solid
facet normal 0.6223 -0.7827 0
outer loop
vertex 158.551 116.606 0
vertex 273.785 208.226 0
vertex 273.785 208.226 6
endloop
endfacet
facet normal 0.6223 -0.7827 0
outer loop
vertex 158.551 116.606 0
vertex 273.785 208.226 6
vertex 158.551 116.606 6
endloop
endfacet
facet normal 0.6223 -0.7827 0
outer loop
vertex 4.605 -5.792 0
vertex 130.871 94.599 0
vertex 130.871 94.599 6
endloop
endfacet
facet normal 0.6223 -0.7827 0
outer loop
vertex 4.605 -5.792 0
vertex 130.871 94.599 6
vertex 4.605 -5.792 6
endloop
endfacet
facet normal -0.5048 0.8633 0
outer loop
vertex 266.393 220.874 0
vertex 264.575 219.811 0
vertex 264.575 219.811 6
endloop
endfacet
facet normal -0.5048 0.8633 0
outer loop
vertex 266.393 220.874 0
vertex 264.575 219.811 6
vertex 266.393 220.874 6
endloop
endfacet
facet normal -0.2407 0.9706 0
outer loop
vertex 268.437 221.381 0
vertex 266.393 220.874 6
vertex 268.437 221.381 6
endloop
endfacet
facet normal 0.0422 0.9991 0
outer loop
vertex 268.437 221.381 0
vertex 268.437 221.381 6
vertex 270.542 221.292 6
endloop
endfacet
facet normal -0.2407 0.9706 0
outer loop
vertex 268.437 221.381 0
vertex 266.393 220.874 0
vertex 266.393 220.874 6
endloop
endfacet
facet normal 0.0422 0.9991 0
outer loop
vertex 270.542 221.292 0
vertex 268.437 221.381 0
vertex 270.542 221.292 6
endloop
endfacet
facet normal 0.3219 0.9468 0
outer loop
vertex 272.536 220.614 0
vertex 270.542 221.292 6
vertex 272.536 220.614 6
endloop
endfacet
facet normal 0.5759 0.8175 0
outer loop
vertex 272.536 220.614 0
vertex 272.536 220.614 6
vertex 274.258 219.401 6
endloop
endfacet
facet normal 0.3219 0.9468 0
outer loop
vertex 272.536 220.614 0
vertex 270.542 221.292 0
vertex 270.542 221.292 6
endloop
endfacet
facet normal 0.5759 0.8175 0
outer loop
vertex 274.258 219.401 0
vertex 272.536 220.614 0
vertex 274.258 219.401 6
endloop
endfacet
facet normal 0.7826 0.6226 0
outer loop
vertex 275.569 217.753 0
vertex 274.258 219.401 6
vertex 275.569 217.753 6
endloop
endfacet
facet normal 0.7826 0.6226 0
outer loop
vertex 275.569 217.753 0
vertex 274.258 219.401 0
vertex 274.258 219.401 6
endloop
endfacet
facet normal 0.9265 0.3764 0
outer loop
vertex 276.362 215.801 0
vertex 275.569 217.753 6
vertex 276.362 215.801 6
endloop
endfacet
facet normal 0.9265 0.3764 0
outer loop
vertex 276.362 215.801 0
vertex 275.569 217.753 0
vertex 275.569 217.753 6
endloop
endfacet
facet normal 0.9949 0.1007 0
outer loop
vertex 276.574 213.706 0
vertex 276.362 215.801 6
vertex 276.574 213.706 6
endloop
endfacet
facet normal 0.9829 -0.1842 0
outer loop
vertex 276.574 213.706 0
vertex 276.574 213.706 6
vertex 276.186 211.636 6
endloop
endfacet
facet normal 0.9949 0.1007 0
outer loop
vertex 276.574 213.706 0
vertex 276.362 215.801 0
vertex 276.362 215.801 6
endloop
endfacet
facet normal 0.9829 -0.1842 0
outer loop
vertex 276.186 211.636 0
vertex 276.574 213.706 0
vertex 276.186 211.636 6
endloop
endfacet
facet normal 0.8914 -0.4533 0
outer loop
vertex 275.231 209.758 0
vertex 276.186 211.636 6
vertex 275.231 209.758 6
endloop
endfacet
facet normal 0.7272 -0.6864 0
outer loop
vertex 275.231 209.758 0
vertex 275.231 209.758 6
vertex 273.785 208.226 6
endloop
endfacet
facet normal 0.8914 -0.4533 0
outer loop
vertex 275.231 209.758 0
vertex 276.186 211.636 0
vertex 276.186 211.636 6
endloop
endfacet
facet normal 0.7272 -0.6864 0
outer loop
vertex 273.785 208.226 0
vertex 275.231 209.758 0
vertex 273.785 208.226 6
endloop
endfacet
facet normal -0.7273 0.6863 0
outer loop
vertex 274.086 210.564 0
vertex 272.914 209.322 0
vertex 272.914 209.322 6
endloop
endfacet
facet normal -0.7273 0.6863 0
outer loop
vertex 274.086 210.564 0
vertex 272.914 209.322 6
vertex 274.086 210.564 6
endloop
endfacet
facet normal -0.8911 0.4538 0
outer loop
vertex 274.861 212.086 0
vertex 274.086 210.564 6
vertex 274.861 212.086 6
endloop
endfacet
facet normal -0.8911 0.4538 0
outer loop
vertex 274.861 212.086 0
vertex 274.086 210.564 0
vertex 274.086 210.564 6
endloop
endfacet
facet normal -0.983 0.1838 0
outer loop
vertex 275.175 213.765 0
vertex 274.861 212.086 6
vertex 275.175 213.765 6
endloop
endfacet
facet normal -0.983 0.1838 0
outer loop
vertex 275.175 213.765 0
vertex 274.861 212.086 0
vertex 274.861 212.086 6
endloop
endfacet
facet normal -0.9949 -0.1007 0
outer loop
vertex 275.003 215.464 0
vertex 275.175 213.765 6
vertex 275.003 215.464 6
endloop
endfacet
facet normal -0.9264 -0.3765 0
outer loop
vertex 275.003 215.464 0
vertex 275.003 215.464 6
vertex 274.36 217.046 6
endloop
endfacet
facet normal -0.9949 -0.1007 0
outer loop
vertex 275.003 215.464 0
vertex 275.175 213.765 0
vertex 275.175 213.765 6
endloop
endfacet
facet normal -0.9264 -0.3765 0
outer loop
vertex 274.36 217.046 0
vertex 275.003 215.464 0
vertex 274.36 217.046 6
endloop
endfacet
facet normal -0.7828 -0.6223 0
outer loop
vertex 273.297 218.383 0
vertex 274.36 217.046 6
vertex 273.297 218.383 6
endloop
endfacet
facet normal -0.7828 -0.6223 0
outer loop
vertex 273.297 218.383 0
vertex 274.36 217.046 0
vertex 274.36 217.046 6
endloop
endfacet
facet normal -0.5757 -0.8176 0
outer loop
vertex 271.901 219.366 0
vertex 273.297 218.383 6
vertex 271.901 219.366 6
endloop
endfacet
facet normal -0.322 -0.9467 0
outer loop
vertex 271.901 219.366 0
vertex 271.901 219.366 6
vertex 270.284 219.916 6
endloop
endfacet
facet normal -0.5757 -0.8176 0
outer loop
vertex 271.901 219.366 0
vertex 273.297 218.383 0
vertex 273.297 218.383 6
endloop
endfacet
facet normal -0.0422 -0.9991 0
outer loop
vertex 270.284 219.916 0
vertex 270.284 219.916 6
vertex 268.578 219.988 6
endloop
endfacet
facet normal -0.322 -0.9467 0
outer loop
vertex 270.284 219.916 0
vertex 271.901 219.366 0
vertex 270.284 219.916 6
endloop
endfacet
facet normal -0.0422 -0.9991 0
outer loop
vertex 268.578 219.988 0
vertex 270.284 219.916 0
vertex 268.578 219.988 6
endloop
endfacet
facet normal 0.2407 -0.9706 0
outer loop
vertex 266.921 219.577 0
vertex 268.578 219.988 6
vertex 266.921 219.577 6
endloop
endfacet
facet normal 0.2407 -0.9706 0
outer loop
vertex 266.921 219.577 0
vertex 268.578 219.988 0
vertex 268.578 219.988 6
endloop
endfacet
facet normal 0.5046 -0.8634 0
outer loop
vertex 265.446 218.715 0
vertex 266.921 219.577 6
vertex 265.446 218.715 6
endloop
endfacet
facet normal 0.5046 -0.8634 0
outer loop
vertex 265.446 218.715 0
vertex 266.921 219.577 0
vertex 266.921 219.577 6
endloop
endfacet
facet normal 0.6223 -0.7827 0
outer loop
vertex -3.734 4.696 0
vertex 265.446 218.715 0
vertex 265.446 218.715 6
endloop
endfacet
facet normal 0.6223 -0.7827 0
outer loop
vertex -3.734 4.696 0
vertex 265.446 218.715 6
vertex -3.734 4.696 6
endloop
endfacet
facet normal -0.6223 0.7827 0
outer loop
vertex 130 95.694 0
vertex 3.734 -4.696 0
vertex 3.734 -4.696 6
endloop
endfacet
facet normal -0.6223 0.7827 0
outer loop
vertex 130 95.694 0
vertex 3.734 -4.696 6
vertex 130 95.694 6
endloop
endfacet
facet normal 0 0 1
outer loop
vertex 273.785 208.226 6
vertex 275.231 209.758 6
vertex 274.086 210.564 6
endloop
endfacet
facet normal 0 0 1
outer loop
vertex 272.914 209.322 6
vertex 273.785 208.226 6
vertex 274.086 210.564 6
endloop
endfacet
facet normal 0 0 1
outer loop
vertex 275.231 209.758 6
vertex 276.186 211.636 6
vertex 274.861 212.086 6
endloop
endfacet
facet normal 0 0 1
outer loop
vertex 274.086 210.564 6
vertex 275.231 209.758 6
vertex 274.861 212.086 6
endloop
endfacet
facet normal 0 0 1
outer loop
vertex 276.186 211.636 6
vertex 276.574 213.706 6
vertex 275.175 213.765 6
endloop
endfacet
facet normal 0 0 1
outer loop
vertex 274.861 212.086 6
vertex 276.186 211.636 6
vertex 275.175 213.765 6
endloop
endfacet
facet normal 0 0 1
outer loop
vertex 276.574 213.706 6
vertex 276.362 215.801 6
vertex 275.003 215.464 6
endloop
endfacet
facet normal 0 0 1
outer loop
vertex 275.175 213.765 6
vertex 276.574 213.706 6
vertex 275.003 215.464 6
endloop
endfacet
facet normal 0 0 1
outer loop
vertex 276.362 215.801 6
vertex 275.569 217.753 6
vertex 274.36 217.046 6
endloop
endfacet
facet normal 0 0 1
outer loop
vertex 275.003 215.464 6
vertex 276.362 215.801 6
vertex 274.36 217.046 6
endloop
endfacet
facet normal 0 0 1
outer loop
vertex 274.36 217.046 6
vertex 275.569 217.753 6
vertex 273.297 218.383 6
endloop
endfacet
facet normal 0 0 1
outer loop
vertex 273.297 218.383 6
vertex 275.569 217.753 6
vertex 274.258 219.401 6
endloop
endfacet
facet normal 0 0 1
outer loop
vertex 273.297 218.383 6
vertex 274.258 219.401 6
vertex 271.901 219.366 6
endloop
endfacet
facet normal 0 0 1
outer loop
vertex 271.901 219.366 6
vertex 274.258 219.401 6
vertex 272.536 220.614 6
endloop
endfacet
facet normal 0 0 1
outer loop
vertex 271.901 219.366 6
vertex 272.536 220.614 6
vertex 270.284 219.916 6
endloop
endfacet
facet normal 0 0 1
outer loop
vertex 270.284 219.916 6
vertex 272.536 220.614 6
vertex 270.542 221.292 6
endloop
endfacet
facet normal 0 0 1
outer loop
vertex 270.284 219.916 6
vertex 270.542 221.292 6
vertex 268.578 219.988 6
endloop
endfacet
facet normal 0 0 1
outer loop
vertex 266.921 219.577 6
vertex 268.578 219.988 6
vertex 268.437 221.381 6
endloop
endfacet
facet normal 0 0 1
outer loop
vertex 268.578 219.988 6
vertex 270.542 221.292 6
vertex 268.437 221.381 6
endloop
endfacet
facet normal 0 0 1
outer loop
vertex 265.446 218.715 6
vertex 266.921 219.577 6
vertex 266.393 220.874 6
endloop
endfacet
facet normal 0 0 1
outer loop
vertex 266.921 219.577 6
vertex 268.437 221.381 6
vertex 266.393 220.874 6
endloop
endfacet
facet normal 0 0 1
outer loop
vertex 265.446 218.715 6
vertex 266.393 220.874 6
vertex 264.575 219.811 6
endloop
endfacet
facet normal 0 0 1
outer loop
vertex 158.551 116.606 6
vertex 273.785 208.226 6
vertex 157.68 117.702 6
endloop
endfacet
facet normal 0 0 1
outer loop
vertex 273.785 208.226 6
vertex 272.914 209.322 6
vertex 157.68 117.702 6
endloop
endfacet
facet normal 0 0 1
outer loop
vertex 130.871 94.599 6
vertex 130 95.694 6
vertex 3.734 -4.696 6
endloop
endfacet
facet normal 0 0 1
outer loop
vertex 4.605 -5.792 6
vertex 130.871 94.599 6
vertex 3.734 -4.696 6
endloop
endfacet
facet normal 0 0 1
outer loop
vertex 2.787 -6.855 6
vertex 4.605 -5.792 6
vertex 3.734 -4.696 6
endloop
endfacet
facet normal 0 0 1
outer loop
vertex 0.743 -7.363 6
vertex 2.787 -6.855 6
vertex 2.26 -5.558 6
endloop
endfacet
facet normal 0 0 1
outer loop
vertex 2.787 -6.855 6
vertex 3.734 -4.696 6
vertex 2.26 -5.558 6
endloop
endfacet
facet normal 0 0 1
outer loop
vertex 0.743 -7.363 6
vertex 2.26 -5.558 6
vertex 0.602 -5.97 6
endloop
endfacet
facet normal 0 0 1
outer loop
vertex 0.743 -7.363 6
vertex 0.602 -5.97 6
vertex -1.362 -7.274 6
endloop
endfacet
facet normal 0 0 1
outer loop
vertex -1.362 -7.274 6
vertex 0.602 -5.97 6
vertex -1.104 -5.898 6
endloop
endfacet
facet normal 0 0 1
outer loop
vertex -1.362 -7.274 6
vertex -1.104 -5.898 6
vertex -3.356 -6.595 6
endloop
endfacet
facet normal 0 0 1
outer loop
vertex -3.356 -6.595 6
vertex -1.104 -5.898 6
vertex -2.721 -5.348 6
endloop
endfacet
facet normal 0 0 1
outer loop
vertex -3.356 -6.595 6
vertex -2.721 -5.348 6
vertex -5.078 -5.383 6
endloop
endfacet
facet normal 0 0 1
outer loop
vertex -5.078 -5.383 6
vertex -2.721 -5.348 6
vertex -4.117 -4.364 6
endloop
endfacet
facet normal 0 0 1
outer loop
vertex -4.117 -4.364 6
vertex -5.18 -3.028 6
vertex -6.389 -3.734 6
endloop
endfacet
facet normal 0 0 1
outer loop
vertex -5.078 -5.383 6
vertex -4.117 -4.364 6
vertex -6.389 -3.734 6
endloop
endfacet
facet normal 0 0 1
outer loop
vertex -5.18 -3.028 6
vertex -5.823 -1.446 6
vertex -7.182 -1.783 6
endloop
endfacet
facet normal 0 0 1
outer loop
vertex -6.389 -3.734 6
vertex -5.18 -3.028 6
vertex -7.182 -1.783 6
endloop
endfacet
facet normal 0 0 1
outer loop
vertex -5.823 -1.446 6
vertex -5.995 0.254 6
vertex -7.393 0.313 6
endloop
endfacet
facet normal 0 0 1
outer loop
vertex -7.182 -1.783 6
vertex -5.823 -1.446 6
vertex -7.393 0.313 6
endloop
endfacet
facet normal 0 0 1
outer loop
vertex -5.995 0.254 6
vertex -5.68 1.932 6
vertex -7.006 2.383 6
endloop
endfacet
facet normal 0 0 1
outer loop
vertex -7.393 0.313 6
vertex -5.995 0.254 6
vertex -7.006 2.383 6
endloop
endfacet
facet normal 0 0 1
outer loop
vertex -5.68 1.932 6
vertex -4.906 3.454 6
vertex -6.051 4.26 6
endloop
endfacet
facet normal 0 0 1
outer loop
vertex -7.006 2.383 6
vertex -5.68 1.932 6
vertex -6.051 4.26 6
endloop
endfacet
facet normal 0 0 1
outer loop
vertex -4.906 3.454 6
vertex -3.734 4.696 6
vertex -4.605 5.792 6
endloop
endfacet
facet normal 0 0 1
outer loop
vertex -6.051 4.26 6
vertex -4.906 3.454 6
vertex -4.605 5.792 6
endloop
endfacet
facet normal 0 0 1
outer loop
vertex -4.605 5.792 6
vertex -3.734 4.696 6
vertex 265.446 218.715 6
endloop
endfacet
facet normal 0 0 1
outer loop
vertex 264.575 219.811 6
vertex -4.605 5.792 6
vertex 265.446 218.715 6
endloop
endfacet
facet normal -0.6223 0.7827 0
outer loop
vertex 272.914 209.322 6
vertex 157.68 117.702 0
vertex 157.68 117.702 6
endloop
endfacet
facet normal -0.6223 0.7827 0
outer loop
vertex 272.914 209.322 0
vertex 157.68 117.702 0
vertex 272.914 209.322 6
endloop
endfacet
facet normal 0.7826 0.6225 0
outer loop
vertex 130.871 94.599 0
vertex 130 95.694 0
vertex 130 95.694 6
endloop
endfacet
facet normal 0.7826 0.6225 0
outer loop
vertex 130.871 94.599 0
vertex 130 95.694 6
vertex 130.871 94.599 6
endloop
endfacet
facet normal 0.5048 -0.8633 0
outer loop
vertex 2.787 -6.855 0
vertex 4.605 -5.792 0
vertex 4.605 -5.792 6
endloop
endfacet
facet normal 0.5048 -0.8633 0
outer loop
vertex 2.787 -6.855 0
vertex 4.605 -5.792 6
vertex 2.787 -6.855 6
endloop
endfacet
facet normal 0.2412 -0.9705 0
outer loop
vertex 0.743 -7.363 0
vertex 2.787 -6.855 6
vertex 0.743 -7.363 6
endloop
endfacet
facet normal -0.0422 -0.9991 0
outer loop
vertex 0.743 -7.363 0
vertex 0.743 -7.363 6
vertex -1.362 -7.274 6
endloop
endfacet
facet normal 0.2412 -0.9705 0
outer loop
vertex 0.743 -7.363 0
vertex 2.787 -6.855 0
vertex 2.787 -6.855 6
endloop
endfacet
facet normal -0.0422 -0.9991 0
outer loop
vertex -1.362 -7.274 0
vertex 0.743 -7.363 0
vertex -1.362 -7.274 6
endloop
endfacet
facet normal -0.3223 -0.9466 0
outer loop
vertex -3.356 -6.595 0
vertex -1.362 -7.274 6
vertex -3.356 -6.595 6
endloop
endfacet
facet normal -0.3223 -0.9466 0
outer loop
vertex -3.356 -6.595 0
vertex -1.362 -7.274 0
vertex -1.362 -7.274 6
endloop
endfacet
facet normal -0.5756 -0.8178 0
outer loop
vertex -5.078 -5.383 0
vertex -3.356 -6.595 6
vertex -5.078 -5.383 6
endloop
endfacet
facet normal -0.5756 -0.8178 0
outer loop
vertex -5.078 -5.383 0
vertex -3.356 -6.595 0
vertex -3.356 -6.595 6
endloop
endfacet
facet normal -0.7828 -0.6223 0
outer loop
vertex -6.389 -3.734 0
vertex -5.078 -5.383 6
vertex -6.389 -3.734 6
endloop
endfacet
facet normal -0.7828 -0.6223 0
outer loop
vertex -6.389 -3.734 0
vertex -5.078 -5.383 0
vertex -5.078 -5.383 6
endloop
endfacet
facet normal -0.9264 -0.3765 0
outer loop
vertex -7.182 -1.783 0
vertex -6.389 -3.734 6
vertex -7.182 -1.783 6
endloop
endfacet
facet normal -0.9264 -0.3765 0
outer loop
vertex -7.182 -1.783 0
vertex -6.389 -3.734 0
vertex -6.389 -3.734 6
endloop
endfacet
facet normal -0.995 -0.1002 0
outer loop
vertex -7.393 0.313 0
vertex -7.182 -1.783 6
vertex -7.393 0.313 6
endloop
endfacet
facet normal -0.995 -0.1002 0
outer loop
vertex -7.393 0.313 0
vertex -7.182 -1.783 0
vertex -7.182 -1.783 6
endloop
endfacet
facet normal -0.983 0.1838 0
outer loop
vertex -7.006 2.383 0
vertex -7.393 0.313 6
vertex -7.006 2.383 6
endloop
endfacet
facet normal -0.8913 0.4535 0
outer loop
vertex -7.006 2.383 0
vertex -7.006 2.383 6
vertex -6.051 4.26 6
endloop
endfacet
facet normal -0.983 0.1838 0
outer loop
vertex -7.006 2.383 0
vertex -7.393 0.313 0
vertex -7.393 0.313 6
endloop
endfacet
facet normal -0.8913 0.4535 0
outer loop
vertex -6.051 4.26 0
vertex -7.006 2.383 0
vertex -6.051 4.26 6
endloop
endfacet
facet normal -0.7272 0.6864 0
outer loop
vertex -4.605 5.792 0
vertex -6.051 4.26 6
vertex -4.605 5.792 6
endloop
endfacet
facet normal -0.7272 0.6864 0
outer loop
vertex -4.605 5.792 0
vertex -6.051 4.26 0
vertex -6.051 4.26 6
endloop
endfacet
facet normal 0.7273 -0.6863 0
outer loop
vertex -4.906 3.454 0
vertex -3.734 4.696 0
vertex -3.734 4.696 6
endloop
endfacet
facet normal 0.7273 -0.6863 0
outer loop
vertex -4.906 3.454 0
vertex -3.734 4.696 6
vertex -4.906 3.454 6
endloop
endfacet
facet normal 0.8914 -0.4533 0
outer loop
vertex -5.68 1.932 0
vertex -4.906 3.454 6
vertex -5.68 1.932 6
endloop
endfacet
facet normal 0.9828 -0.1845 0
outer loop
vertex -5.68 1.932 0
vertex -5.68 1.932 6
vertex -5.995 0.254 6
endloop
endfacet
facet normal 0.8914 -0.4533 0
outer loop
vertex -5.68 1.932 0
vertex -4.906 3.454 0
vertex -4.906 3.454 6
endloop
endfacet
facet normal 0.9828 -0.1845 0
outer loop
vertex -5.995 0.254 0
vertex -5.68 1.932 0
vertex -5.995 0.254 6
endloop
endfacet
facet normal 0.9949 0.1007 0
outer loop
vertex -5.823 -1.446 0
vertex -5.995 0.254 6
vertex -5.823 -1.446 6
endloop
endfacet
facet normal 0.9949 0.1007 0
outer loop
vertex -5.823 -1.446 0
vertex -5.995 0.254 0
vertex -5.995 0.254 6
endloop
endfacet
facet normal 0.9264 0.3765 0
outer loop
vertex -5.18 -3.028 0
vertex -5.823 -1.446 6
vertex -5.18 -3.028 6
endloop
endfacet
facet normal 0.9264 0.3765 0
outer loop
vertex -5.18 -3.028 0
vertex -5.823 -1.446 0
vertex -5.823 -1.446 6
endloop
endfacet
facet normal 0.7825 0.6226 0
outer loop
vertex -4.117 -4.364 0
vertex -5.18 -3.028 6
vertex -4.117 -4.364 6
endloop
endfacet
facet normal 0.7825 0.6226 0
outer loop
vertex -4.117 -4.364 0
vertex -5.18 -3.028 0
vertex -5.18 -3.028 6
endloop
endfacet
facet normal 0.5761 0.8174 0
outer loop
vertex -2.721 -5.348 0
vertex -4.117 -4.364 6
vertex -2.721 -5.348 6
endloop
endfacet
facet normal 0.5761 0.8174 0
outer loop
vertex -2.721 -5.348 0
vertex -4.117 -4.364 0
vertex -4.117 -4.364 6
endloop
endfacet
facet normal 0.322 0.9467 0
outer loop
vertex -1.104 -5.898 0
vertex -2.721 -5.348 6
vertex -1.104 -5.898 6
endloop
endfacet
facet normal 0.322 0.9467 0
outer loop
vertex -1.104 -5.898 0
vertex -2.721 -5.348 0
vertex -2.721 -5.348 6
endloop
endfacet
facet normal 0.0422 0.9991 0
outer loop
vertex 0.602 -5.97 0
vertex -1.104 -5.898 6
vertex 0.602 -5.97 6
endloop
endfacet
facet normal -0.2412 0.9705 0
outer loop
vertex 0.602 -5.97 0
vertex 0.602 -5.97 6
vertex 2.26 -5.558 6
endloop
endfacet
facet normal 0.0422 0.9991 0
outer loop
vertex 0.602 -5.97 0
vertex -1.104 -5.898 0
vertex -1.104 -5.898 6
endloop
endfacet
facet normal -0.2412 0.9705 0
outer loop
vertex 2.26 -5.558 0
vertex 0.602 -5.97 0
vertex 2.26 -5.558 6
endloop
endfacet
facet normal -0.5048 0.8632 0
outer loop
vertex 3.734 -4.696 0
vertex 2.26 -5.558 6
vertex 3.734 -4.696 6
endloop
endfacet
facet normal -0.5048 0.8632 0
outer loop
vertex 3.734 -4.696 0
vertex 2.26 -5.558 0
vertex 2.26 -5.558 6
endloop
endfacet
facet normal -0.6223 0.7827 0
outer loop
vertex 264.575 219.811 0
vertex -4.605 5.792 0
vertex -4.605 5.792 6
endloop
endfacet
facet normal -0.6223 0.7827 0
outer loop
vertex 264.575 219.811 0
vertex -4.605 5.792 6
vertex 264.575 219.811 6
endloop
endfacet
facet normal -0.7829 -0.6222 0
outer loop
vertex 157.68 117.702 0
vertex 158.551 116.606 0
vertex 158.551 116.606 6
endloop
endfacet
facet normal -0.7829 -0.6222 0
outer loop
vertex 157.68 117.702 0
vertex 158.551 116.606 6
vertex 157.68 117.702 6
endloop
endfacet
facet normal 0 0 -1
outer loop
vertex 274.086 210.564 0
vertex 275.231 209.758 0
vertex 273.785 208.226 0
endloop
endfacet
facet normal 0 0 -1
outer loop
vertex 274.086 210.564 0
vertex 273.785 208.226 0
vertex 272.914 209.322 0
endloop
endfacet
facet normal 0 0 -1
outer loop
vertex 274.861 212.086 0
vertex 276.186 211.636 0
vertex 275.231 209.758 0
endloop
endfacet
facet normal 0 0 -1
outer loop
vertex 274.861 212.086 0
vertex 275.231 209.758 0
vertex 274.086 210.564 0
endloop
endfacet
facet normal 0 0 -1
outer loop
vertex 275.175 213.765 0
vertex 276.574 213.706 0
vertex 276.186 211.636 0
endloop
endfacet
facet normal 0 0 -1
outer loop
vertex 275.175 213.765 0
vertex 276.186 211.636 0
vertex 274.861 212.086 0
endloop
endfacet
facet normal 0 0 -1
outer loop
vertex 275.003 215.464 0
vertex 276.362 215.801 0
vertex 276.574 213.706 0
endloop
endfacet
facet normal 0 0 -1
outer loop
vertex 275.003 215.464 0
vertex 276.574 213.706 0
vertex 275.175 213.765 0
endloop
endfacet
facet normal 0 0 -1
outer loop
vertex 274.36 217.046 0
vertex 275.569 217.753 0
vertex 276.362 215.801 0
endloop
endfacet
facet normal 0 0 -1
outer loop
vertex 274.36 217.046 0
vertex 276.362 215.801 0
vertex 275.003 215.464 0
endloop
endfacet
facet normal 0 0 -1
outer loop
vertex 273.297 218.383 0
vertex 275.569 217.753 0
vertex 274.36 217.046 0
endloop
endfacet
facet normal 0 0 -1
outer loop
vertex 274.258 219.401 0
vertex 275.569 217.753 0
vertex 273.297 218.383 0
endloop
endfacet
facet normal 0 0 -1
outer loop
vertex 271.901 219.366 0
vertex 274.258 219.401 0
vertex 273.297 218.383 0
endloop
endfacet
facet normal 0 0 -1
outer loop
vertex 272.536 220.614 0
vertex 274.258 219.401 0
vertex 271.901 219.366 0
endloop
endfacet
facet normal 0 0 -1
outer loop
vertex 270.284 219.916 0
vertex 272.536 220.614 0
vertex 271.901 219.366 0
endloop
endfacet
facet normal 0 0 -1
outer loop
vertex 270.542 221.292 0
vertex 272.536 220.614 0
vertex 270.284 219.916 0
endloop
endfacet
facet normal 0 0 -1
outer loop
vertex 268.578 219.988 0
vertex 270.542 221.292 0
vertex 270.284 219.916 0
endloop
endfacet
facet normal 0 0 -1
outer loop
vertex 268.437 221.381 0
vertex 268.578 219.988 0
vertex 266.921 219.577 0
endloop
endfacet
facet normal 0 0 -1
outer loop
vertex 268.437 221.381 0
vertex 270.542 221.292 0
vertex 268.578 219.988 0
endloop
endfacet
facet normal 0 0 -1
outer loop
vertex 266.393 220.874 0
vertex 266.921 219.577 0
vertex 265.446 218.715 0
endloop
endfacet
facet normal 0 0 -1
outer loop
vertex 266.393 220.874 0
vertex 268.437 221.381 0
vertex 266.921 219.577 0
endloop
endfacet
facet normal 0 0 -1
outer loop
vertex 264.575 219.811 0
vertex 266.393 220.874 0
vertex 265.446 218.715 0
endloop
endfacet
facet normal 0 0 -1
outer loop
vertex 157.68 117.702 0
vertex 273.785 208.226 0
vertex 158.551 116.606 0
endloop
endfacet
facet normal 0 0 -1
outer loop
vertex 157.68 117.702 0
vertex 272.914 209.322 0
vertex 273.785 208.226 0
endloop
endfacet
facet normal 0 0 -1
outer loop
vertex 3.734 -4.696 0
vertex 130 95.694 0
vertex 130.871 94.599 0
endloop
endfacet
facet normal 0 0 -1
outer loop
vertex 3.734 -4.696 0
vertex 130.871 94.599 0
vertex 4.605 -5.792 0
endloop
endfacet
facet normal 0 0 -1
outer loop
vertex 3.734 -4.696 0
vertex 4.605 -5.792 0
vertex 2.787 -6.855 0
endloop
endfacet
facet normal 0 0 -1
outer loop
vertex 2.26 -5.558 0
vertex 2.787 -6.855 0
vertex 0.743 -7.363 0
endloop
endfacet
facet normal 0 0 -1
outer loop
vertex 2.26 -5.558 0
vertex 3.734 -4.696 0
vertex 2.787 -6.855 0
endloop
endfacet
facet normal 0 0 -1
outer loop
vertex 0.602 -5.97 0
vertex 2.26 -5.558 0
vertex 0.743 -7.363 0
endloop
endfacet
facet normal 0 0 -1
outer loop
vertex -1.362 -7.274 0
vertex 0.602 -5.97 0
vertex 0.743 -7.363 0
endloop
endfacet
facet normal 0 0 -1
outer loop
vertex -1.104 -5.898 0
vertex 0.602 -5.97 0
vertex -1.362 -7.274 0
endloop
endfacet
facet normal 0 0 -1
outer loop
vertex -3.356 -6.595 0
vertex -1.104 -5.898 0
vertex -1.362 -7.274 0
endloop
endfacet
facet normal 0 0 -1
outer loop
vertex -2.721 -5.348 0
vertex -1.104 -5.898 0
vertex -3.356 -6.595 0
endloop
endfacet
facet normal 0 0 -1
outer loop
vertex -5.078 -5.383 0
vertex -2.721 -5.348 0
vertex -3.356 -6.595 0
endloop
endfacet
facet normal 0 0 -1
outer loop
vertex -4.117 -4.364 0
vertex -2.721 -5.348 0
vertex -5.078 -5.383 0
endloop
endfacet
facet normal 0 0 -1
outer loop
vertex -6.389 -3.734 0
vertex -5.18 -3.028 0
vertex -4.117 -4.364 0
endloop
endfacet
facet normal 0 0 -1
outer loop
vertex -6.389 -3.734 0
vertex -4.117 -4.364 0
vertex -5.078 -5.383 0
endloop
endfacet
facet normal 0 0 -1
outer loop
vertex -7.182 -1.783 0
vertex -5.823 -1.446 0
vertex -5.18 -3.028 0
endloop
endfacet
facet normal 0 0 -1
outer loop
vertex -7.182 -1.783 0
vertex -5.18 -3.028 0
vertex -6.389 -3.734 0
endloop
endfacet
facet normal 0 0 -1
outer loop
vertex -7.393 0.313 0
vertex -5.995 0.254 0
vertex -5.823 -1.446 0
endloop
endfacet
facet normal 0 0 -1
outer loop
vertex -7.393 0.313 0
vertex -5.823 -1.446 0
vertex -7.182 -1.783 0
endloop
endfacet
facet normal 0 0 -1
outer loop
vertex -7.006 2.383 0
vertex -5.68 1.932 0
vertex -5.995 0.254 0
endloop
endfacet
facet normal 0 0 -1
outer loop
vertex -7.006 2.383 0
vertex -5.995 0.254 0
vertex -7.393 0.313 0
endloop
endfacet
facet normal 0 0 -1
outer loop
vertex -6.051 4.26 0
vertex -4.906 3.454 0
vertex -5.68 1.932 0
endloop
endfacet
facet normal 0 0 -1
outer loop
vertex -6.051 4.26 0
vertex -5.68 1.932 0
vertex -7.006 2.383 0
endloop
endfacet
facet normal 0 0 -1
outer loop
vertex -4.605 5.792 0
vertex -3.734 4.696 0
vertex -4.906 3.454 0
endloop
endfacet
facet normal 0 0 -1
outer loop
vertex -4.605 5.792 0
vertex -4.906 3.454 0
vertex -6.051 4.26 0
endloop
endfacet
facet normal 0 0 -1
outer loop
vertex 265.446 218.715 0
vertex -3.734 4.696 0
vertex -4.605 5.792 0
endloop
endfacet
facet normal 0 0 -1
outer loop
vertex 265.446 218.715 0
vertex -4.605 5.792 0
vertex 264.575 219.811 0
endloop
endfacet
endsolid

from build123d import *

# Parameters (mm, degrees)
EXTRUDE_1_DEPTH = 6


with BuildPart() as part:
    # Эскиз1 → Бобышка-Вытянуть1 (new body)
    with BuildSketch(Plane(origin=(0, 0, 0), x_dir=(-1, 0, 0), z_dir=(0, 0, -1))):
        with BuildLine():
            Line((-265.446108594, 218.715019647), (3.734050958, 4.696473511))
            ThreePointArc((3.734050958, 4.696473511), (4.696473511, -3.734050958), (-3.734050958, -4.696473511))
            Line((-3.734050958, -4.696473511), (-130, 95.694487269))
            Line((-130, 95.694487269), (-130.871278557, 94.598643449))
            Line((-130.871278557, 94.598643449), (-4.605329515, -5.79231733))
            ThreePointArc((-4.605329515, -5.79231733), (5.79231733, -4.605329515), (4.605329515, 5.79231733))
            Line((4.605329515, 5.79231733), (-264.574830037, 219.810863466))
            ThreePointArc((-264.574830037, 219.810863466), (-274.972476883, 218.623875651), (-273.785489068, 208.226228806))
            Line((-273.785489068, 208.226228806), (-158.550793978, 116.60594762))
            Line((-158.550793978, 116.60594762), (-157.679515421, 117.70179144))
            Line((-157.679515421, 117.70179144), (-272.914210511, 209.322072625))
            ThreePointArc((-272.914210511, 209.322072625), (-273.876633064, 217.752597094), (-265.446108594, 218.715019647))
        make_face()
    extrude(amount=-EXTRUDE_1_DEPTH)


solid = part.part
